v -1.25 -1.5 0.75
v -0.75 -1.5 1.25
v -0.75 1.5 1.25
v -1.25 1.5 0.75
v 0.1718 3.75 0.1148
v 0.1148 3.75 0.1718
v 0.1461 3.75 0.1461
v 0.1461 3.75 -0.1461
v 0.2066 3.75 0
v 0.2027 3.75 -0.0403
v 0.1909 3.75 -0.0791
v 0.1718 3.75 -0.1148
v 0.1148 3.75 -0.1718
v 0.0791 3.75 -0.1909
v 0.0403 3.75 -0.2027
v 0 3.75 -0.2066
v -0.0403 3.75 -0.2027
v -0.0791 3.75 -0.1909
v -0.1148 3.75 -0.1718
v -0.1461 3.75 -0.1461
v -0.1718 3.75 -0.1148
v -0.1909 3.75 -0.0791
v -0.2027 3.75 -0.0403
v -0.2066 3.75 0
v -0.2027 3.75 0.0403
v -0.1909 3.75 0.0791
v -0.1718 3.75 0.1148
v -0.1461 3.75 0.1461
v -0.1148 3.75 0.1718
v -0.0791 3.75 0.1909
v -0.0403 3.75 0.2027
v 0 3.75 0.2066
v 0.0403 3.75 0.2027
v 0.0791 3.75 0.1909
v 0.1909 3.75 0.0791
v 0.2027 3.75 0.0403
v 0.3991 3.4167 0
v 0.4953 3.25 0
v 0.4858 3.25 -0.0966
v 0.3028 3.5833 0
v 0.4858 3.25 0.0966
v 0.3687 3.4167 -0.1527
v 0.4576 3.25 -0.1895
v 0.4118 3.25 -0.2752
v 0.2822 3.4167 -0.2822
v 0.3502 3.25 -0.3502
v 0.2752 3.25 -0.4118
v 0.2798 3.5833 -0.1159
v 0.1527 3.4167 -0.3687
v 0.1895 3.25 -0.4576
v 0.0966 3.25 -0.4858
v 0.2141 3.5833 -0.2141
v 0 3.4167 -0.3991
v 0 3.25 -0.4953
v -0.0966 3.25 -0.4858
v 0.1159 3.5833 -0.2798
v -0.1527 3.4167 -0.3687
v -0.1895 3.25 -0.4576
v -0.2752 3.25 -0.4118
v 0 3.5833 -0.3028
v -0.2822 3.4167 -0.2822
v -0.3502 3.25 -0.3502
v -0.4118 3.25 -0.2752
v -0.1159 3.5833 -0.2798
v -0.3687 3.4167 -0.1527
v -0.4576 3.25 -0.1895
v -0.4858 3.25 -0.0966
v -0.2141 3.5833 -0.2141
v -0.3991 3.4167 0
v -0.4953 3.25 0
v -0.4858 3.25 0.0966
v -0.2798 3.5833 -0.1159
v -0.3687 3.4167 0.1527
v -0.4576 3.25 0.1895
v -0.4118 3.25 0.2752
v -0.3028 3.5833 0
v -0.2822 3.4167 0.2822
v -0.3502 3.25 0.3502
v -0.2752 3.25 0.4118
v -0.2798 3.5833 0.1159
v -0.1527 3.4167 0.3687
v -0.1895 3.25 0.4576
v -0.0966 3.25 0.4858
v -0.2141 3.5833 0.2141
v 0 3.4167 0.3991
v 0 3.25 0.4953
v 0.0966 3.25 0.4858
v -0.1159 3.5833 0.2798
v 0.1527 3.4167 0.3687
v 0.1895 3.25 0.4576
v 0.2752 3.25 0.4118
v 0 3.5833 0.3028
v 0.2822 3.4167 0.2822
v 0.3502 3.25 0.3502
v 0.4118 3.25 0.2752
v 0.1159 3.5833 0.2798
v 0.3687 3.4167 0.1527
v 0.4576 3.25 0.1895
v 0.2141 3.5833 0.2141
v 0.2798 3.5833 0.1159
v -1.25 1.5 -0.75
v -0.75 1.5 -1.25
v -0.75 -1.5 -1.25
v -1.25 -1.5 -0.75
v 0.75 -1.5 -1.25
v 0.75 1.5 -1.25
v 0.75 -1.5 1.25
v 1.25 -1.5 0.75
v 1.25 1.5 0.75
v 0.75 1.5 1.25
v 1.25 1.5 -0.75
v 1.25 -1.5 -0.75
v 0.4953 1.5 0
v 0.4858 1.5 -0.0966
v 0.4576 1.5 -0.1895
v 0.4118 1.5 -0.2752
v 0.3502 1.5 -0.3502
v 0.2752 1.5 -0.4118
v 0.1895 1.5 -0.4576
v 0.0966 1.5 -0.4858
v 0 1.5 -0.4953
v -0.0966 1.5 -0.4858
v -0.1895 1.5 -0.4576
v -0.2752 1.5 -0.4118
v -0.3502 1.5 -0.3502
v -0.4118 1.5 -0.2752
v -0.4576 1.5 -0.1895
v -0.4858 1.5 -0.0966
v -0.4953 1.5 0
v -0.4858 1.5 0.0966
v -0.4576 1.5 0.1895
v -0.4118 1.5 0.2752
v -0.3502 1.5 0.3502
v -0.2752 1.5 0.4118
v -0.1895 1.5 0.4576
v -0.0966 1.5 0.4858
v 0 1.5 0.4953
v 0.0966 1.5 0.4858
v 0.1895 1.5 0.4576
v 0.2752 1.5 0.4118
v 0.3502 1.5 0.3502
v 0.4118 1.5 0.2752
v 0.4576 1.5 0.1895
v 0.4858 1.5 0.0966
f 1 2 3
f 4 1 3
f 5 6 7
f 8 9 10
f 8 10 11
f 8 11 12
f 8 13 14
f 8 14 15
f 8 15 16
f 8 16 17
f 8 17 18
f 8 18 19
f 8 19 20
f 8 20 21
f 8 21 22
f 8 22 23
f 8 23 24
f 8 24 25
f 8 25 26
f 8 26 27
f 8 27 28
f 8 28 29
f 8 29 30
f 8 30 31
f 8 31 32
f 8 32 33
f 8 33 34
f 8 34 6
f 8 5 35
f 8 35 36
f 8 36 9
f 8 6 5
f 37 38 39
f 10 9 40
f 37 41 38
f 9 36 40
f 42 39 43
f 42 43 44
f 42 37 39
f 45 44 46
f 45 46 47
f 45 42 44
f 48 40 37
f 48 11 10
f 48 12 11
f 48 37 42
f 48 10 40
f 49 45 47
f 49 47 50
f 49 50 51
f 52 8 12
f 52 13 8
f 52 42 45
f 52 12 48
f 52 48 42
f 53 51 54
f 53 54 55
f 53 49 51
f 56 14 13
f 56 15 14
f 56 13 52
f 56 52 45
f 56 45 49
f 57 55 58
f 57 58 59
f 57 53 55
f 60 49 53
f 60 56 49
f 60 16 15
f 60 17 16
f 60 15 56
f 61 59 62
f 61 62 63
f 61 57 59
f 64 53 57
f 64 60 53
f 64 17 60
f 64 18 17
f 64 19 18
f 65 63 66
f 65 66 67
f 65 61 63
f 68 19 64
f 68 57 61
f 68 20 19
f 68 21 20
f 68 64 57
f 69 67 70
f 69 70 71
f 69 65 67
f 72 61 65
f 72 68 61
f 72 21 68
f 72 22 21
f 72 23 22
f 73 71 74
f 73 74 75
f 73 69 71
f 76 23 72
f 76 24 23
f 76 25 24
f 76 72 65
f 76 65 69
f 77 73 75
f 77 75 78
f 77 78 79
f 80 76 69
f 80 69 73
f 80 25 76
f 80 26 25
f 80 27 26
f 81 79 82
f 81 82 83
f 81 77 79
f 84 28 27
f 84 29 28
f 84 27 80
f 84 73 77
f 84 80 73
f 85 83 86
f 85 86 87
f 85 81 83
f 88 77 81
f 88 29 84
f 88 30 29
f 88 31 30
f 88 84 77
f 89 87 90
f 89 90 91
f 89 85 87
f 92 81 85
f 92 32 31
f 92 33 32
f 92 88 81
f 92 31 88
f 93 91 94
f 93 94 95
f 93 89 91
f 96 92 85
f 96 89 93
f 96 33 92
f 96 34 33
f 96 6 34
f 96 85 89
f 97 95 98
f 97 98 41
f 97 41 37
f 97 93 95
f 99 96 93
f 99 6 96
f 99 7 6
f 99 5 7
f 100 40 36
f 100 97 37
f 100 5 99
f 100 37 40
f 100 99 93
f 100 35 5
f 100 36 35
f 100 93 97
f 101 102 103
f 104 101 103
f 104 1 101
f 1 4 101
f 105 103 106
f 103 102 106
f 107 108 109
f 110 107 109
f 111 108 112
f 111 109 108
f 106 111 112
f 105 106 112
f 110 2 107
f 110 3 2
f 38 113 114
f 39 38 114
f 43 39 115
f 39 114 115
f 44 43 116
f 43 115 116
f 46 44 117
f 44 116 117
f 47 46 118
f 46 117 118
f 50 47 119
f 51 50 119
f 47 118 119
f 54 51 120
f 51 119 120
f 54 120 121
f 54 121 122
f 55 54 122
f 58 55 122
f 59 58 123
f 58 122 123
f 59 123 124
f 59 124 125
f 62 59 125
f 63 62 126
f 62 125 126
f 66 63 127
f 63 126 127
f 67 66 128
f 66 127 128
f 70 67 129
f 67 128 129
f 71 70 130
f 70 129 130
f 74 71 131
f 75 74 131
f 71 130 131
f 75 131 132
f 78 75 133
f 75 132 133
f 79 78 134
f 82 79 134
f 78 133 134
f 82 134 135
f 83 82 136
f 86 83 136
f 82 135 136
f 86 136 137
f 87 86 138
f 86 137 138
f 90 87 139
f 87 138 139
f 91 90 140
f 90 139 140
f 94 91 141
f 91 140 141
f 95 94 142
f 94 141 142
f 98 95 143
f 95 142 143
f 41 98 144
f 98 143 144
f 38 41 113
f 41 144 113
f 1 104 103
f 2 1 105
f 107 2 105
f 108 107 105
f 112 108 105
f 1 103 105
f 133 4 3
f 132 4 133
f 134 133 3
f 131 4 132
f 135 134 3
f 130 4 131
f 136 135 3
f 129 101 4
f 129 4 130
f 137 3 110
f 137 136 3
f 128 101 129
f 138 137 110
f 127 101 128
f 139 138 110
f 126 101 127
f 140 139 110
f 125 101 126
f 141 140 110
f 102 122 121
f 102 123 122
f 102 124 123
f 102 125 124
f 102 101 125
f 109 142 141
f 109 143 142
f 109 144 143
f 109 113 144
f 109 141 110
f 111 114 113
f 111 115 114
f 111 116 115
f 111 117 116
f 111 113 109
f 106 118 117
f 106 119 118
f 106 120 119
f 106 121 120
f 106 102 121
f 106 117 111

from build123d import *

# Parameters (mm, degrees)
SKETCH1_W           = 2.5
SKETCH1_H           = 2.5
BOSS_EXTRUDE1_DEPTH = 1.5
SKETCH2_R           = 0.4953
BOSS_EXTRUDE2_DEPTH = 2.25
CHAMFER1_SIZE       = 0.5
CHAMFER1_SIZE2      = 0.288675135
CHAMFER2_SIZE       = 0.5


with BuildPart() as part:
    # Sketch1 → Boss-Extrude1 (new body, symmetric)
    with BuildSketch(Plane(origin=(0, 0, 0), x_dir=(1, 0, 0), z_dir=(0, 1, 0))):
        Rectangle(SKETCH1_W, SKETCH1_H)
    extrude(amount=BOSS_EXTRUDE1_DEPTH, both=True)

    # Sketch2 → Boss-Extrude2 (add)
    with BuildSketch(Plane(origin=(0, 1.5, 0), x_dir=(1, 0, 0), z_dir=(0, 1, 0))):
        Circle(SKETCH2_R)
    extrude(amount=BOSS_EXTRUDE2_DEPTH)

    # Chamfer1
    chamfer1_edges = [part.edges().sort_by_distance(p)[0] for p in [
        (-0.4953, 3.75, 0),
    ]]
    chamfer1_side = [part.faces().sort_by_distance(p)[0] for p in [
        (-0.4953, 2.625, 0),
    ]]
    chamfer(chamfer1_edges, length=CHAMFER1_SIZE, length2=CHAMFER1_SIZE2, reference=chamfer1_side[0])

    # Chamfer2
    chamfer2_edges = [part.edges().sort_by_distance(p)[0] for p in [
        (-1.25, 0, 1.25),
        (-1.25, 0, -1.25),
        (1.25, 0, -1.25),
        (1.25, 0, 1.25),
    ]]
    chamfer(chamfer2_edges, length=CHAMFER2_SIZE)


solid = part.part
